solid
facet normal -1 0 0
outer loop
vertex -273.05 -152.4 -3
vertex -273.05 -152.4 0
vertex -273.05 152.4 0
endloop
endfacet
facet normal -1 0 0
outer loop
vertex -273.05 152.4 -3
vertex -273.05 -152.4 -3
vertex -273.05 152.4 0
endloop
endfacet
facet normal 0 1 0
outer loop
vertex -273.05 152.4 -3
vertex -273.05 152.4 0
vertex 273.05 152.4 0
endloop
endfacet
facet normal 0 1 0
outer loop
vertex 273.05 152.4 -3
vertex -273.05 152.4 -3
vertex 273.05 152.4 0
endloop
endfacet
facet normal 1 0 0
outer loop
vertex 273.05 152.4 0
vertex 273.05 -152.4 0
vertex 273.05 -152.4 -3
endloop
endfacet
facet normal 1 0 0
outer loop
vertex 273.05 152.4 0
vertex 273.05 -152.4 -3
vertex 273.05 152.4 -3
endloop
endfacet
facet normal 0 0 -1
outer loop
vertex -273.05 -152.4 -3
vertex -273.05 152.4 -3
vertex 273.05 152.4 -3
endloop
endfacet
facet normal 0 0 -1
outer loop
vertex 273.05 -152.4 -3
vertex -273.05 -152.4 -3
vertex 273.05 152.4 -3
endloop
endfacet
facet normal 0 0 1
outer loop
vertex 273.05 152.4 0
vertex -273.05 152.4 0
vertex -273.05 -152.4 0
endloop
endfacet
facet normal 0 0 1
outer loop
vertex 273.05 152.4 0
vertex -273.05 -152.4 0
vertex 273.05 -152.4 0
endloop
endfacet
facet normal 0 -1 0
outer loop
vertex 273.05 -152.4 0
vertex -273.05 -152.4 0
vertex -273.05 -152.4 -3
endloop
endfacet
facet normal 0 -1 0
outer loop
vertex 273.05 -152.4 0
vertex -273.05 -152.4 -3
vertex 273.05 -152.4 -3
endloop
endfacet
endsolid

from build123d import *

# Parameters (mm, degrees)
PLAYFIELD_W             = 508
PLAYFIELD_H             = 266.7
PLAYFIELD_R             = 18.415
BOSS_EXTRUDE1_DEPTH     = 3
OUTER_BOUNDARY_W        = 546.1
OUTER_BOUNDARY_H        = 304.8
BOSS_EXTRUDE2_DEPTH     = 3
CUT_EXTRUDE1_DEPTH      = 313.715625609
CUT_EXTRUDE1_DEPTH_BACK = 313.715625609
PLAYFIELD_2_R           = 18.415
PLAYFIELD_3_W           = 508
PLAYFIELD_3_H           = 266.7
PLAYFIELD_3_R           = 18.415
CUT_EXTRUDE2_DEPTH      = 3
SKETCH1_R               = 18.415
BOSS_EXTRUDE3_DEPTH     = 3


with BuildPart() as part:
    # PlayField → Boss-Extrude1 (new body)
    with BuildSketch(Plane.XY):
        Rectangle(PLAYFIELD_W, PLAYFIELD_H)
        with Locations((-218.44, 0)):
            Circle(PLAYFIELD_R, mode=Mode.SUBTRACT)
        with Locations((218.44, 0)):
            Circle(PLAYFIELD_R, mode=Mode.SUBTRACT)
    extrude(amount=BOSS_EXTRUDE1_DEPTH)

    # Outer Boundary → Boss-Extrude2 (add)
    with BuildSketch(Plane.XY):
        Rectangle(OUTER_BOUNDARY_W, OUTER_BOUNDARY_H)
    extrude(amount=-BOSS_EXTRUDE2_DEPTH)

    # PlayField<2> → Cut-Extrude1 (cut, two sides: drawn at the far end of the back side and taken through both)
    with BuildSketch(Plane.XY.offset(-CUT_EXTRUDE1_DEPTH_BACK)):
        with Locations((-218.44, 0)):
            Circle(PLAYFIELD_2_R)
        with Locations((218.44, 0)):
            Circle(PLAYFIELD_2_R)
    extrude(amount=CUT_EXTRUDE1_DEPTH + CUT_EXTRUDE1_DEPTH_BACK, mode=Mode.SUBTRACT)

    # PlayField<3> → Cut-Extrude2 (cut)
    with BuildSketch(Plane.XY):
        Rectangle(PLAYFIELD_3_W, PLAYFIELD_3_H)
        with Locations((-218.44, 0)):
            Circle(PLAYFIELD_3_R, mode=Mode.SUBTRACT)
        with Locations((218.44, 0)):
            Circle(PLAYFIELD_3_R, mode=Mode.SUBTRACT)
    extrude(amount=CUT_EXTRUDE2_DEPTH, mode=Mode.SUBTRACT)

    # Sketch1 → Boss-Extrude3 (add)
    with BuildSketch(Plane.XY):
        with Locations((-218.44, 0)):
            Circle(SKETCH1_R)
        with Locations((218.44, 0)):
            Circle(SKETCH1_R)
    extrude(amount=-BOSS_EXTRUDE3_DEPTH)


solid = part.part
